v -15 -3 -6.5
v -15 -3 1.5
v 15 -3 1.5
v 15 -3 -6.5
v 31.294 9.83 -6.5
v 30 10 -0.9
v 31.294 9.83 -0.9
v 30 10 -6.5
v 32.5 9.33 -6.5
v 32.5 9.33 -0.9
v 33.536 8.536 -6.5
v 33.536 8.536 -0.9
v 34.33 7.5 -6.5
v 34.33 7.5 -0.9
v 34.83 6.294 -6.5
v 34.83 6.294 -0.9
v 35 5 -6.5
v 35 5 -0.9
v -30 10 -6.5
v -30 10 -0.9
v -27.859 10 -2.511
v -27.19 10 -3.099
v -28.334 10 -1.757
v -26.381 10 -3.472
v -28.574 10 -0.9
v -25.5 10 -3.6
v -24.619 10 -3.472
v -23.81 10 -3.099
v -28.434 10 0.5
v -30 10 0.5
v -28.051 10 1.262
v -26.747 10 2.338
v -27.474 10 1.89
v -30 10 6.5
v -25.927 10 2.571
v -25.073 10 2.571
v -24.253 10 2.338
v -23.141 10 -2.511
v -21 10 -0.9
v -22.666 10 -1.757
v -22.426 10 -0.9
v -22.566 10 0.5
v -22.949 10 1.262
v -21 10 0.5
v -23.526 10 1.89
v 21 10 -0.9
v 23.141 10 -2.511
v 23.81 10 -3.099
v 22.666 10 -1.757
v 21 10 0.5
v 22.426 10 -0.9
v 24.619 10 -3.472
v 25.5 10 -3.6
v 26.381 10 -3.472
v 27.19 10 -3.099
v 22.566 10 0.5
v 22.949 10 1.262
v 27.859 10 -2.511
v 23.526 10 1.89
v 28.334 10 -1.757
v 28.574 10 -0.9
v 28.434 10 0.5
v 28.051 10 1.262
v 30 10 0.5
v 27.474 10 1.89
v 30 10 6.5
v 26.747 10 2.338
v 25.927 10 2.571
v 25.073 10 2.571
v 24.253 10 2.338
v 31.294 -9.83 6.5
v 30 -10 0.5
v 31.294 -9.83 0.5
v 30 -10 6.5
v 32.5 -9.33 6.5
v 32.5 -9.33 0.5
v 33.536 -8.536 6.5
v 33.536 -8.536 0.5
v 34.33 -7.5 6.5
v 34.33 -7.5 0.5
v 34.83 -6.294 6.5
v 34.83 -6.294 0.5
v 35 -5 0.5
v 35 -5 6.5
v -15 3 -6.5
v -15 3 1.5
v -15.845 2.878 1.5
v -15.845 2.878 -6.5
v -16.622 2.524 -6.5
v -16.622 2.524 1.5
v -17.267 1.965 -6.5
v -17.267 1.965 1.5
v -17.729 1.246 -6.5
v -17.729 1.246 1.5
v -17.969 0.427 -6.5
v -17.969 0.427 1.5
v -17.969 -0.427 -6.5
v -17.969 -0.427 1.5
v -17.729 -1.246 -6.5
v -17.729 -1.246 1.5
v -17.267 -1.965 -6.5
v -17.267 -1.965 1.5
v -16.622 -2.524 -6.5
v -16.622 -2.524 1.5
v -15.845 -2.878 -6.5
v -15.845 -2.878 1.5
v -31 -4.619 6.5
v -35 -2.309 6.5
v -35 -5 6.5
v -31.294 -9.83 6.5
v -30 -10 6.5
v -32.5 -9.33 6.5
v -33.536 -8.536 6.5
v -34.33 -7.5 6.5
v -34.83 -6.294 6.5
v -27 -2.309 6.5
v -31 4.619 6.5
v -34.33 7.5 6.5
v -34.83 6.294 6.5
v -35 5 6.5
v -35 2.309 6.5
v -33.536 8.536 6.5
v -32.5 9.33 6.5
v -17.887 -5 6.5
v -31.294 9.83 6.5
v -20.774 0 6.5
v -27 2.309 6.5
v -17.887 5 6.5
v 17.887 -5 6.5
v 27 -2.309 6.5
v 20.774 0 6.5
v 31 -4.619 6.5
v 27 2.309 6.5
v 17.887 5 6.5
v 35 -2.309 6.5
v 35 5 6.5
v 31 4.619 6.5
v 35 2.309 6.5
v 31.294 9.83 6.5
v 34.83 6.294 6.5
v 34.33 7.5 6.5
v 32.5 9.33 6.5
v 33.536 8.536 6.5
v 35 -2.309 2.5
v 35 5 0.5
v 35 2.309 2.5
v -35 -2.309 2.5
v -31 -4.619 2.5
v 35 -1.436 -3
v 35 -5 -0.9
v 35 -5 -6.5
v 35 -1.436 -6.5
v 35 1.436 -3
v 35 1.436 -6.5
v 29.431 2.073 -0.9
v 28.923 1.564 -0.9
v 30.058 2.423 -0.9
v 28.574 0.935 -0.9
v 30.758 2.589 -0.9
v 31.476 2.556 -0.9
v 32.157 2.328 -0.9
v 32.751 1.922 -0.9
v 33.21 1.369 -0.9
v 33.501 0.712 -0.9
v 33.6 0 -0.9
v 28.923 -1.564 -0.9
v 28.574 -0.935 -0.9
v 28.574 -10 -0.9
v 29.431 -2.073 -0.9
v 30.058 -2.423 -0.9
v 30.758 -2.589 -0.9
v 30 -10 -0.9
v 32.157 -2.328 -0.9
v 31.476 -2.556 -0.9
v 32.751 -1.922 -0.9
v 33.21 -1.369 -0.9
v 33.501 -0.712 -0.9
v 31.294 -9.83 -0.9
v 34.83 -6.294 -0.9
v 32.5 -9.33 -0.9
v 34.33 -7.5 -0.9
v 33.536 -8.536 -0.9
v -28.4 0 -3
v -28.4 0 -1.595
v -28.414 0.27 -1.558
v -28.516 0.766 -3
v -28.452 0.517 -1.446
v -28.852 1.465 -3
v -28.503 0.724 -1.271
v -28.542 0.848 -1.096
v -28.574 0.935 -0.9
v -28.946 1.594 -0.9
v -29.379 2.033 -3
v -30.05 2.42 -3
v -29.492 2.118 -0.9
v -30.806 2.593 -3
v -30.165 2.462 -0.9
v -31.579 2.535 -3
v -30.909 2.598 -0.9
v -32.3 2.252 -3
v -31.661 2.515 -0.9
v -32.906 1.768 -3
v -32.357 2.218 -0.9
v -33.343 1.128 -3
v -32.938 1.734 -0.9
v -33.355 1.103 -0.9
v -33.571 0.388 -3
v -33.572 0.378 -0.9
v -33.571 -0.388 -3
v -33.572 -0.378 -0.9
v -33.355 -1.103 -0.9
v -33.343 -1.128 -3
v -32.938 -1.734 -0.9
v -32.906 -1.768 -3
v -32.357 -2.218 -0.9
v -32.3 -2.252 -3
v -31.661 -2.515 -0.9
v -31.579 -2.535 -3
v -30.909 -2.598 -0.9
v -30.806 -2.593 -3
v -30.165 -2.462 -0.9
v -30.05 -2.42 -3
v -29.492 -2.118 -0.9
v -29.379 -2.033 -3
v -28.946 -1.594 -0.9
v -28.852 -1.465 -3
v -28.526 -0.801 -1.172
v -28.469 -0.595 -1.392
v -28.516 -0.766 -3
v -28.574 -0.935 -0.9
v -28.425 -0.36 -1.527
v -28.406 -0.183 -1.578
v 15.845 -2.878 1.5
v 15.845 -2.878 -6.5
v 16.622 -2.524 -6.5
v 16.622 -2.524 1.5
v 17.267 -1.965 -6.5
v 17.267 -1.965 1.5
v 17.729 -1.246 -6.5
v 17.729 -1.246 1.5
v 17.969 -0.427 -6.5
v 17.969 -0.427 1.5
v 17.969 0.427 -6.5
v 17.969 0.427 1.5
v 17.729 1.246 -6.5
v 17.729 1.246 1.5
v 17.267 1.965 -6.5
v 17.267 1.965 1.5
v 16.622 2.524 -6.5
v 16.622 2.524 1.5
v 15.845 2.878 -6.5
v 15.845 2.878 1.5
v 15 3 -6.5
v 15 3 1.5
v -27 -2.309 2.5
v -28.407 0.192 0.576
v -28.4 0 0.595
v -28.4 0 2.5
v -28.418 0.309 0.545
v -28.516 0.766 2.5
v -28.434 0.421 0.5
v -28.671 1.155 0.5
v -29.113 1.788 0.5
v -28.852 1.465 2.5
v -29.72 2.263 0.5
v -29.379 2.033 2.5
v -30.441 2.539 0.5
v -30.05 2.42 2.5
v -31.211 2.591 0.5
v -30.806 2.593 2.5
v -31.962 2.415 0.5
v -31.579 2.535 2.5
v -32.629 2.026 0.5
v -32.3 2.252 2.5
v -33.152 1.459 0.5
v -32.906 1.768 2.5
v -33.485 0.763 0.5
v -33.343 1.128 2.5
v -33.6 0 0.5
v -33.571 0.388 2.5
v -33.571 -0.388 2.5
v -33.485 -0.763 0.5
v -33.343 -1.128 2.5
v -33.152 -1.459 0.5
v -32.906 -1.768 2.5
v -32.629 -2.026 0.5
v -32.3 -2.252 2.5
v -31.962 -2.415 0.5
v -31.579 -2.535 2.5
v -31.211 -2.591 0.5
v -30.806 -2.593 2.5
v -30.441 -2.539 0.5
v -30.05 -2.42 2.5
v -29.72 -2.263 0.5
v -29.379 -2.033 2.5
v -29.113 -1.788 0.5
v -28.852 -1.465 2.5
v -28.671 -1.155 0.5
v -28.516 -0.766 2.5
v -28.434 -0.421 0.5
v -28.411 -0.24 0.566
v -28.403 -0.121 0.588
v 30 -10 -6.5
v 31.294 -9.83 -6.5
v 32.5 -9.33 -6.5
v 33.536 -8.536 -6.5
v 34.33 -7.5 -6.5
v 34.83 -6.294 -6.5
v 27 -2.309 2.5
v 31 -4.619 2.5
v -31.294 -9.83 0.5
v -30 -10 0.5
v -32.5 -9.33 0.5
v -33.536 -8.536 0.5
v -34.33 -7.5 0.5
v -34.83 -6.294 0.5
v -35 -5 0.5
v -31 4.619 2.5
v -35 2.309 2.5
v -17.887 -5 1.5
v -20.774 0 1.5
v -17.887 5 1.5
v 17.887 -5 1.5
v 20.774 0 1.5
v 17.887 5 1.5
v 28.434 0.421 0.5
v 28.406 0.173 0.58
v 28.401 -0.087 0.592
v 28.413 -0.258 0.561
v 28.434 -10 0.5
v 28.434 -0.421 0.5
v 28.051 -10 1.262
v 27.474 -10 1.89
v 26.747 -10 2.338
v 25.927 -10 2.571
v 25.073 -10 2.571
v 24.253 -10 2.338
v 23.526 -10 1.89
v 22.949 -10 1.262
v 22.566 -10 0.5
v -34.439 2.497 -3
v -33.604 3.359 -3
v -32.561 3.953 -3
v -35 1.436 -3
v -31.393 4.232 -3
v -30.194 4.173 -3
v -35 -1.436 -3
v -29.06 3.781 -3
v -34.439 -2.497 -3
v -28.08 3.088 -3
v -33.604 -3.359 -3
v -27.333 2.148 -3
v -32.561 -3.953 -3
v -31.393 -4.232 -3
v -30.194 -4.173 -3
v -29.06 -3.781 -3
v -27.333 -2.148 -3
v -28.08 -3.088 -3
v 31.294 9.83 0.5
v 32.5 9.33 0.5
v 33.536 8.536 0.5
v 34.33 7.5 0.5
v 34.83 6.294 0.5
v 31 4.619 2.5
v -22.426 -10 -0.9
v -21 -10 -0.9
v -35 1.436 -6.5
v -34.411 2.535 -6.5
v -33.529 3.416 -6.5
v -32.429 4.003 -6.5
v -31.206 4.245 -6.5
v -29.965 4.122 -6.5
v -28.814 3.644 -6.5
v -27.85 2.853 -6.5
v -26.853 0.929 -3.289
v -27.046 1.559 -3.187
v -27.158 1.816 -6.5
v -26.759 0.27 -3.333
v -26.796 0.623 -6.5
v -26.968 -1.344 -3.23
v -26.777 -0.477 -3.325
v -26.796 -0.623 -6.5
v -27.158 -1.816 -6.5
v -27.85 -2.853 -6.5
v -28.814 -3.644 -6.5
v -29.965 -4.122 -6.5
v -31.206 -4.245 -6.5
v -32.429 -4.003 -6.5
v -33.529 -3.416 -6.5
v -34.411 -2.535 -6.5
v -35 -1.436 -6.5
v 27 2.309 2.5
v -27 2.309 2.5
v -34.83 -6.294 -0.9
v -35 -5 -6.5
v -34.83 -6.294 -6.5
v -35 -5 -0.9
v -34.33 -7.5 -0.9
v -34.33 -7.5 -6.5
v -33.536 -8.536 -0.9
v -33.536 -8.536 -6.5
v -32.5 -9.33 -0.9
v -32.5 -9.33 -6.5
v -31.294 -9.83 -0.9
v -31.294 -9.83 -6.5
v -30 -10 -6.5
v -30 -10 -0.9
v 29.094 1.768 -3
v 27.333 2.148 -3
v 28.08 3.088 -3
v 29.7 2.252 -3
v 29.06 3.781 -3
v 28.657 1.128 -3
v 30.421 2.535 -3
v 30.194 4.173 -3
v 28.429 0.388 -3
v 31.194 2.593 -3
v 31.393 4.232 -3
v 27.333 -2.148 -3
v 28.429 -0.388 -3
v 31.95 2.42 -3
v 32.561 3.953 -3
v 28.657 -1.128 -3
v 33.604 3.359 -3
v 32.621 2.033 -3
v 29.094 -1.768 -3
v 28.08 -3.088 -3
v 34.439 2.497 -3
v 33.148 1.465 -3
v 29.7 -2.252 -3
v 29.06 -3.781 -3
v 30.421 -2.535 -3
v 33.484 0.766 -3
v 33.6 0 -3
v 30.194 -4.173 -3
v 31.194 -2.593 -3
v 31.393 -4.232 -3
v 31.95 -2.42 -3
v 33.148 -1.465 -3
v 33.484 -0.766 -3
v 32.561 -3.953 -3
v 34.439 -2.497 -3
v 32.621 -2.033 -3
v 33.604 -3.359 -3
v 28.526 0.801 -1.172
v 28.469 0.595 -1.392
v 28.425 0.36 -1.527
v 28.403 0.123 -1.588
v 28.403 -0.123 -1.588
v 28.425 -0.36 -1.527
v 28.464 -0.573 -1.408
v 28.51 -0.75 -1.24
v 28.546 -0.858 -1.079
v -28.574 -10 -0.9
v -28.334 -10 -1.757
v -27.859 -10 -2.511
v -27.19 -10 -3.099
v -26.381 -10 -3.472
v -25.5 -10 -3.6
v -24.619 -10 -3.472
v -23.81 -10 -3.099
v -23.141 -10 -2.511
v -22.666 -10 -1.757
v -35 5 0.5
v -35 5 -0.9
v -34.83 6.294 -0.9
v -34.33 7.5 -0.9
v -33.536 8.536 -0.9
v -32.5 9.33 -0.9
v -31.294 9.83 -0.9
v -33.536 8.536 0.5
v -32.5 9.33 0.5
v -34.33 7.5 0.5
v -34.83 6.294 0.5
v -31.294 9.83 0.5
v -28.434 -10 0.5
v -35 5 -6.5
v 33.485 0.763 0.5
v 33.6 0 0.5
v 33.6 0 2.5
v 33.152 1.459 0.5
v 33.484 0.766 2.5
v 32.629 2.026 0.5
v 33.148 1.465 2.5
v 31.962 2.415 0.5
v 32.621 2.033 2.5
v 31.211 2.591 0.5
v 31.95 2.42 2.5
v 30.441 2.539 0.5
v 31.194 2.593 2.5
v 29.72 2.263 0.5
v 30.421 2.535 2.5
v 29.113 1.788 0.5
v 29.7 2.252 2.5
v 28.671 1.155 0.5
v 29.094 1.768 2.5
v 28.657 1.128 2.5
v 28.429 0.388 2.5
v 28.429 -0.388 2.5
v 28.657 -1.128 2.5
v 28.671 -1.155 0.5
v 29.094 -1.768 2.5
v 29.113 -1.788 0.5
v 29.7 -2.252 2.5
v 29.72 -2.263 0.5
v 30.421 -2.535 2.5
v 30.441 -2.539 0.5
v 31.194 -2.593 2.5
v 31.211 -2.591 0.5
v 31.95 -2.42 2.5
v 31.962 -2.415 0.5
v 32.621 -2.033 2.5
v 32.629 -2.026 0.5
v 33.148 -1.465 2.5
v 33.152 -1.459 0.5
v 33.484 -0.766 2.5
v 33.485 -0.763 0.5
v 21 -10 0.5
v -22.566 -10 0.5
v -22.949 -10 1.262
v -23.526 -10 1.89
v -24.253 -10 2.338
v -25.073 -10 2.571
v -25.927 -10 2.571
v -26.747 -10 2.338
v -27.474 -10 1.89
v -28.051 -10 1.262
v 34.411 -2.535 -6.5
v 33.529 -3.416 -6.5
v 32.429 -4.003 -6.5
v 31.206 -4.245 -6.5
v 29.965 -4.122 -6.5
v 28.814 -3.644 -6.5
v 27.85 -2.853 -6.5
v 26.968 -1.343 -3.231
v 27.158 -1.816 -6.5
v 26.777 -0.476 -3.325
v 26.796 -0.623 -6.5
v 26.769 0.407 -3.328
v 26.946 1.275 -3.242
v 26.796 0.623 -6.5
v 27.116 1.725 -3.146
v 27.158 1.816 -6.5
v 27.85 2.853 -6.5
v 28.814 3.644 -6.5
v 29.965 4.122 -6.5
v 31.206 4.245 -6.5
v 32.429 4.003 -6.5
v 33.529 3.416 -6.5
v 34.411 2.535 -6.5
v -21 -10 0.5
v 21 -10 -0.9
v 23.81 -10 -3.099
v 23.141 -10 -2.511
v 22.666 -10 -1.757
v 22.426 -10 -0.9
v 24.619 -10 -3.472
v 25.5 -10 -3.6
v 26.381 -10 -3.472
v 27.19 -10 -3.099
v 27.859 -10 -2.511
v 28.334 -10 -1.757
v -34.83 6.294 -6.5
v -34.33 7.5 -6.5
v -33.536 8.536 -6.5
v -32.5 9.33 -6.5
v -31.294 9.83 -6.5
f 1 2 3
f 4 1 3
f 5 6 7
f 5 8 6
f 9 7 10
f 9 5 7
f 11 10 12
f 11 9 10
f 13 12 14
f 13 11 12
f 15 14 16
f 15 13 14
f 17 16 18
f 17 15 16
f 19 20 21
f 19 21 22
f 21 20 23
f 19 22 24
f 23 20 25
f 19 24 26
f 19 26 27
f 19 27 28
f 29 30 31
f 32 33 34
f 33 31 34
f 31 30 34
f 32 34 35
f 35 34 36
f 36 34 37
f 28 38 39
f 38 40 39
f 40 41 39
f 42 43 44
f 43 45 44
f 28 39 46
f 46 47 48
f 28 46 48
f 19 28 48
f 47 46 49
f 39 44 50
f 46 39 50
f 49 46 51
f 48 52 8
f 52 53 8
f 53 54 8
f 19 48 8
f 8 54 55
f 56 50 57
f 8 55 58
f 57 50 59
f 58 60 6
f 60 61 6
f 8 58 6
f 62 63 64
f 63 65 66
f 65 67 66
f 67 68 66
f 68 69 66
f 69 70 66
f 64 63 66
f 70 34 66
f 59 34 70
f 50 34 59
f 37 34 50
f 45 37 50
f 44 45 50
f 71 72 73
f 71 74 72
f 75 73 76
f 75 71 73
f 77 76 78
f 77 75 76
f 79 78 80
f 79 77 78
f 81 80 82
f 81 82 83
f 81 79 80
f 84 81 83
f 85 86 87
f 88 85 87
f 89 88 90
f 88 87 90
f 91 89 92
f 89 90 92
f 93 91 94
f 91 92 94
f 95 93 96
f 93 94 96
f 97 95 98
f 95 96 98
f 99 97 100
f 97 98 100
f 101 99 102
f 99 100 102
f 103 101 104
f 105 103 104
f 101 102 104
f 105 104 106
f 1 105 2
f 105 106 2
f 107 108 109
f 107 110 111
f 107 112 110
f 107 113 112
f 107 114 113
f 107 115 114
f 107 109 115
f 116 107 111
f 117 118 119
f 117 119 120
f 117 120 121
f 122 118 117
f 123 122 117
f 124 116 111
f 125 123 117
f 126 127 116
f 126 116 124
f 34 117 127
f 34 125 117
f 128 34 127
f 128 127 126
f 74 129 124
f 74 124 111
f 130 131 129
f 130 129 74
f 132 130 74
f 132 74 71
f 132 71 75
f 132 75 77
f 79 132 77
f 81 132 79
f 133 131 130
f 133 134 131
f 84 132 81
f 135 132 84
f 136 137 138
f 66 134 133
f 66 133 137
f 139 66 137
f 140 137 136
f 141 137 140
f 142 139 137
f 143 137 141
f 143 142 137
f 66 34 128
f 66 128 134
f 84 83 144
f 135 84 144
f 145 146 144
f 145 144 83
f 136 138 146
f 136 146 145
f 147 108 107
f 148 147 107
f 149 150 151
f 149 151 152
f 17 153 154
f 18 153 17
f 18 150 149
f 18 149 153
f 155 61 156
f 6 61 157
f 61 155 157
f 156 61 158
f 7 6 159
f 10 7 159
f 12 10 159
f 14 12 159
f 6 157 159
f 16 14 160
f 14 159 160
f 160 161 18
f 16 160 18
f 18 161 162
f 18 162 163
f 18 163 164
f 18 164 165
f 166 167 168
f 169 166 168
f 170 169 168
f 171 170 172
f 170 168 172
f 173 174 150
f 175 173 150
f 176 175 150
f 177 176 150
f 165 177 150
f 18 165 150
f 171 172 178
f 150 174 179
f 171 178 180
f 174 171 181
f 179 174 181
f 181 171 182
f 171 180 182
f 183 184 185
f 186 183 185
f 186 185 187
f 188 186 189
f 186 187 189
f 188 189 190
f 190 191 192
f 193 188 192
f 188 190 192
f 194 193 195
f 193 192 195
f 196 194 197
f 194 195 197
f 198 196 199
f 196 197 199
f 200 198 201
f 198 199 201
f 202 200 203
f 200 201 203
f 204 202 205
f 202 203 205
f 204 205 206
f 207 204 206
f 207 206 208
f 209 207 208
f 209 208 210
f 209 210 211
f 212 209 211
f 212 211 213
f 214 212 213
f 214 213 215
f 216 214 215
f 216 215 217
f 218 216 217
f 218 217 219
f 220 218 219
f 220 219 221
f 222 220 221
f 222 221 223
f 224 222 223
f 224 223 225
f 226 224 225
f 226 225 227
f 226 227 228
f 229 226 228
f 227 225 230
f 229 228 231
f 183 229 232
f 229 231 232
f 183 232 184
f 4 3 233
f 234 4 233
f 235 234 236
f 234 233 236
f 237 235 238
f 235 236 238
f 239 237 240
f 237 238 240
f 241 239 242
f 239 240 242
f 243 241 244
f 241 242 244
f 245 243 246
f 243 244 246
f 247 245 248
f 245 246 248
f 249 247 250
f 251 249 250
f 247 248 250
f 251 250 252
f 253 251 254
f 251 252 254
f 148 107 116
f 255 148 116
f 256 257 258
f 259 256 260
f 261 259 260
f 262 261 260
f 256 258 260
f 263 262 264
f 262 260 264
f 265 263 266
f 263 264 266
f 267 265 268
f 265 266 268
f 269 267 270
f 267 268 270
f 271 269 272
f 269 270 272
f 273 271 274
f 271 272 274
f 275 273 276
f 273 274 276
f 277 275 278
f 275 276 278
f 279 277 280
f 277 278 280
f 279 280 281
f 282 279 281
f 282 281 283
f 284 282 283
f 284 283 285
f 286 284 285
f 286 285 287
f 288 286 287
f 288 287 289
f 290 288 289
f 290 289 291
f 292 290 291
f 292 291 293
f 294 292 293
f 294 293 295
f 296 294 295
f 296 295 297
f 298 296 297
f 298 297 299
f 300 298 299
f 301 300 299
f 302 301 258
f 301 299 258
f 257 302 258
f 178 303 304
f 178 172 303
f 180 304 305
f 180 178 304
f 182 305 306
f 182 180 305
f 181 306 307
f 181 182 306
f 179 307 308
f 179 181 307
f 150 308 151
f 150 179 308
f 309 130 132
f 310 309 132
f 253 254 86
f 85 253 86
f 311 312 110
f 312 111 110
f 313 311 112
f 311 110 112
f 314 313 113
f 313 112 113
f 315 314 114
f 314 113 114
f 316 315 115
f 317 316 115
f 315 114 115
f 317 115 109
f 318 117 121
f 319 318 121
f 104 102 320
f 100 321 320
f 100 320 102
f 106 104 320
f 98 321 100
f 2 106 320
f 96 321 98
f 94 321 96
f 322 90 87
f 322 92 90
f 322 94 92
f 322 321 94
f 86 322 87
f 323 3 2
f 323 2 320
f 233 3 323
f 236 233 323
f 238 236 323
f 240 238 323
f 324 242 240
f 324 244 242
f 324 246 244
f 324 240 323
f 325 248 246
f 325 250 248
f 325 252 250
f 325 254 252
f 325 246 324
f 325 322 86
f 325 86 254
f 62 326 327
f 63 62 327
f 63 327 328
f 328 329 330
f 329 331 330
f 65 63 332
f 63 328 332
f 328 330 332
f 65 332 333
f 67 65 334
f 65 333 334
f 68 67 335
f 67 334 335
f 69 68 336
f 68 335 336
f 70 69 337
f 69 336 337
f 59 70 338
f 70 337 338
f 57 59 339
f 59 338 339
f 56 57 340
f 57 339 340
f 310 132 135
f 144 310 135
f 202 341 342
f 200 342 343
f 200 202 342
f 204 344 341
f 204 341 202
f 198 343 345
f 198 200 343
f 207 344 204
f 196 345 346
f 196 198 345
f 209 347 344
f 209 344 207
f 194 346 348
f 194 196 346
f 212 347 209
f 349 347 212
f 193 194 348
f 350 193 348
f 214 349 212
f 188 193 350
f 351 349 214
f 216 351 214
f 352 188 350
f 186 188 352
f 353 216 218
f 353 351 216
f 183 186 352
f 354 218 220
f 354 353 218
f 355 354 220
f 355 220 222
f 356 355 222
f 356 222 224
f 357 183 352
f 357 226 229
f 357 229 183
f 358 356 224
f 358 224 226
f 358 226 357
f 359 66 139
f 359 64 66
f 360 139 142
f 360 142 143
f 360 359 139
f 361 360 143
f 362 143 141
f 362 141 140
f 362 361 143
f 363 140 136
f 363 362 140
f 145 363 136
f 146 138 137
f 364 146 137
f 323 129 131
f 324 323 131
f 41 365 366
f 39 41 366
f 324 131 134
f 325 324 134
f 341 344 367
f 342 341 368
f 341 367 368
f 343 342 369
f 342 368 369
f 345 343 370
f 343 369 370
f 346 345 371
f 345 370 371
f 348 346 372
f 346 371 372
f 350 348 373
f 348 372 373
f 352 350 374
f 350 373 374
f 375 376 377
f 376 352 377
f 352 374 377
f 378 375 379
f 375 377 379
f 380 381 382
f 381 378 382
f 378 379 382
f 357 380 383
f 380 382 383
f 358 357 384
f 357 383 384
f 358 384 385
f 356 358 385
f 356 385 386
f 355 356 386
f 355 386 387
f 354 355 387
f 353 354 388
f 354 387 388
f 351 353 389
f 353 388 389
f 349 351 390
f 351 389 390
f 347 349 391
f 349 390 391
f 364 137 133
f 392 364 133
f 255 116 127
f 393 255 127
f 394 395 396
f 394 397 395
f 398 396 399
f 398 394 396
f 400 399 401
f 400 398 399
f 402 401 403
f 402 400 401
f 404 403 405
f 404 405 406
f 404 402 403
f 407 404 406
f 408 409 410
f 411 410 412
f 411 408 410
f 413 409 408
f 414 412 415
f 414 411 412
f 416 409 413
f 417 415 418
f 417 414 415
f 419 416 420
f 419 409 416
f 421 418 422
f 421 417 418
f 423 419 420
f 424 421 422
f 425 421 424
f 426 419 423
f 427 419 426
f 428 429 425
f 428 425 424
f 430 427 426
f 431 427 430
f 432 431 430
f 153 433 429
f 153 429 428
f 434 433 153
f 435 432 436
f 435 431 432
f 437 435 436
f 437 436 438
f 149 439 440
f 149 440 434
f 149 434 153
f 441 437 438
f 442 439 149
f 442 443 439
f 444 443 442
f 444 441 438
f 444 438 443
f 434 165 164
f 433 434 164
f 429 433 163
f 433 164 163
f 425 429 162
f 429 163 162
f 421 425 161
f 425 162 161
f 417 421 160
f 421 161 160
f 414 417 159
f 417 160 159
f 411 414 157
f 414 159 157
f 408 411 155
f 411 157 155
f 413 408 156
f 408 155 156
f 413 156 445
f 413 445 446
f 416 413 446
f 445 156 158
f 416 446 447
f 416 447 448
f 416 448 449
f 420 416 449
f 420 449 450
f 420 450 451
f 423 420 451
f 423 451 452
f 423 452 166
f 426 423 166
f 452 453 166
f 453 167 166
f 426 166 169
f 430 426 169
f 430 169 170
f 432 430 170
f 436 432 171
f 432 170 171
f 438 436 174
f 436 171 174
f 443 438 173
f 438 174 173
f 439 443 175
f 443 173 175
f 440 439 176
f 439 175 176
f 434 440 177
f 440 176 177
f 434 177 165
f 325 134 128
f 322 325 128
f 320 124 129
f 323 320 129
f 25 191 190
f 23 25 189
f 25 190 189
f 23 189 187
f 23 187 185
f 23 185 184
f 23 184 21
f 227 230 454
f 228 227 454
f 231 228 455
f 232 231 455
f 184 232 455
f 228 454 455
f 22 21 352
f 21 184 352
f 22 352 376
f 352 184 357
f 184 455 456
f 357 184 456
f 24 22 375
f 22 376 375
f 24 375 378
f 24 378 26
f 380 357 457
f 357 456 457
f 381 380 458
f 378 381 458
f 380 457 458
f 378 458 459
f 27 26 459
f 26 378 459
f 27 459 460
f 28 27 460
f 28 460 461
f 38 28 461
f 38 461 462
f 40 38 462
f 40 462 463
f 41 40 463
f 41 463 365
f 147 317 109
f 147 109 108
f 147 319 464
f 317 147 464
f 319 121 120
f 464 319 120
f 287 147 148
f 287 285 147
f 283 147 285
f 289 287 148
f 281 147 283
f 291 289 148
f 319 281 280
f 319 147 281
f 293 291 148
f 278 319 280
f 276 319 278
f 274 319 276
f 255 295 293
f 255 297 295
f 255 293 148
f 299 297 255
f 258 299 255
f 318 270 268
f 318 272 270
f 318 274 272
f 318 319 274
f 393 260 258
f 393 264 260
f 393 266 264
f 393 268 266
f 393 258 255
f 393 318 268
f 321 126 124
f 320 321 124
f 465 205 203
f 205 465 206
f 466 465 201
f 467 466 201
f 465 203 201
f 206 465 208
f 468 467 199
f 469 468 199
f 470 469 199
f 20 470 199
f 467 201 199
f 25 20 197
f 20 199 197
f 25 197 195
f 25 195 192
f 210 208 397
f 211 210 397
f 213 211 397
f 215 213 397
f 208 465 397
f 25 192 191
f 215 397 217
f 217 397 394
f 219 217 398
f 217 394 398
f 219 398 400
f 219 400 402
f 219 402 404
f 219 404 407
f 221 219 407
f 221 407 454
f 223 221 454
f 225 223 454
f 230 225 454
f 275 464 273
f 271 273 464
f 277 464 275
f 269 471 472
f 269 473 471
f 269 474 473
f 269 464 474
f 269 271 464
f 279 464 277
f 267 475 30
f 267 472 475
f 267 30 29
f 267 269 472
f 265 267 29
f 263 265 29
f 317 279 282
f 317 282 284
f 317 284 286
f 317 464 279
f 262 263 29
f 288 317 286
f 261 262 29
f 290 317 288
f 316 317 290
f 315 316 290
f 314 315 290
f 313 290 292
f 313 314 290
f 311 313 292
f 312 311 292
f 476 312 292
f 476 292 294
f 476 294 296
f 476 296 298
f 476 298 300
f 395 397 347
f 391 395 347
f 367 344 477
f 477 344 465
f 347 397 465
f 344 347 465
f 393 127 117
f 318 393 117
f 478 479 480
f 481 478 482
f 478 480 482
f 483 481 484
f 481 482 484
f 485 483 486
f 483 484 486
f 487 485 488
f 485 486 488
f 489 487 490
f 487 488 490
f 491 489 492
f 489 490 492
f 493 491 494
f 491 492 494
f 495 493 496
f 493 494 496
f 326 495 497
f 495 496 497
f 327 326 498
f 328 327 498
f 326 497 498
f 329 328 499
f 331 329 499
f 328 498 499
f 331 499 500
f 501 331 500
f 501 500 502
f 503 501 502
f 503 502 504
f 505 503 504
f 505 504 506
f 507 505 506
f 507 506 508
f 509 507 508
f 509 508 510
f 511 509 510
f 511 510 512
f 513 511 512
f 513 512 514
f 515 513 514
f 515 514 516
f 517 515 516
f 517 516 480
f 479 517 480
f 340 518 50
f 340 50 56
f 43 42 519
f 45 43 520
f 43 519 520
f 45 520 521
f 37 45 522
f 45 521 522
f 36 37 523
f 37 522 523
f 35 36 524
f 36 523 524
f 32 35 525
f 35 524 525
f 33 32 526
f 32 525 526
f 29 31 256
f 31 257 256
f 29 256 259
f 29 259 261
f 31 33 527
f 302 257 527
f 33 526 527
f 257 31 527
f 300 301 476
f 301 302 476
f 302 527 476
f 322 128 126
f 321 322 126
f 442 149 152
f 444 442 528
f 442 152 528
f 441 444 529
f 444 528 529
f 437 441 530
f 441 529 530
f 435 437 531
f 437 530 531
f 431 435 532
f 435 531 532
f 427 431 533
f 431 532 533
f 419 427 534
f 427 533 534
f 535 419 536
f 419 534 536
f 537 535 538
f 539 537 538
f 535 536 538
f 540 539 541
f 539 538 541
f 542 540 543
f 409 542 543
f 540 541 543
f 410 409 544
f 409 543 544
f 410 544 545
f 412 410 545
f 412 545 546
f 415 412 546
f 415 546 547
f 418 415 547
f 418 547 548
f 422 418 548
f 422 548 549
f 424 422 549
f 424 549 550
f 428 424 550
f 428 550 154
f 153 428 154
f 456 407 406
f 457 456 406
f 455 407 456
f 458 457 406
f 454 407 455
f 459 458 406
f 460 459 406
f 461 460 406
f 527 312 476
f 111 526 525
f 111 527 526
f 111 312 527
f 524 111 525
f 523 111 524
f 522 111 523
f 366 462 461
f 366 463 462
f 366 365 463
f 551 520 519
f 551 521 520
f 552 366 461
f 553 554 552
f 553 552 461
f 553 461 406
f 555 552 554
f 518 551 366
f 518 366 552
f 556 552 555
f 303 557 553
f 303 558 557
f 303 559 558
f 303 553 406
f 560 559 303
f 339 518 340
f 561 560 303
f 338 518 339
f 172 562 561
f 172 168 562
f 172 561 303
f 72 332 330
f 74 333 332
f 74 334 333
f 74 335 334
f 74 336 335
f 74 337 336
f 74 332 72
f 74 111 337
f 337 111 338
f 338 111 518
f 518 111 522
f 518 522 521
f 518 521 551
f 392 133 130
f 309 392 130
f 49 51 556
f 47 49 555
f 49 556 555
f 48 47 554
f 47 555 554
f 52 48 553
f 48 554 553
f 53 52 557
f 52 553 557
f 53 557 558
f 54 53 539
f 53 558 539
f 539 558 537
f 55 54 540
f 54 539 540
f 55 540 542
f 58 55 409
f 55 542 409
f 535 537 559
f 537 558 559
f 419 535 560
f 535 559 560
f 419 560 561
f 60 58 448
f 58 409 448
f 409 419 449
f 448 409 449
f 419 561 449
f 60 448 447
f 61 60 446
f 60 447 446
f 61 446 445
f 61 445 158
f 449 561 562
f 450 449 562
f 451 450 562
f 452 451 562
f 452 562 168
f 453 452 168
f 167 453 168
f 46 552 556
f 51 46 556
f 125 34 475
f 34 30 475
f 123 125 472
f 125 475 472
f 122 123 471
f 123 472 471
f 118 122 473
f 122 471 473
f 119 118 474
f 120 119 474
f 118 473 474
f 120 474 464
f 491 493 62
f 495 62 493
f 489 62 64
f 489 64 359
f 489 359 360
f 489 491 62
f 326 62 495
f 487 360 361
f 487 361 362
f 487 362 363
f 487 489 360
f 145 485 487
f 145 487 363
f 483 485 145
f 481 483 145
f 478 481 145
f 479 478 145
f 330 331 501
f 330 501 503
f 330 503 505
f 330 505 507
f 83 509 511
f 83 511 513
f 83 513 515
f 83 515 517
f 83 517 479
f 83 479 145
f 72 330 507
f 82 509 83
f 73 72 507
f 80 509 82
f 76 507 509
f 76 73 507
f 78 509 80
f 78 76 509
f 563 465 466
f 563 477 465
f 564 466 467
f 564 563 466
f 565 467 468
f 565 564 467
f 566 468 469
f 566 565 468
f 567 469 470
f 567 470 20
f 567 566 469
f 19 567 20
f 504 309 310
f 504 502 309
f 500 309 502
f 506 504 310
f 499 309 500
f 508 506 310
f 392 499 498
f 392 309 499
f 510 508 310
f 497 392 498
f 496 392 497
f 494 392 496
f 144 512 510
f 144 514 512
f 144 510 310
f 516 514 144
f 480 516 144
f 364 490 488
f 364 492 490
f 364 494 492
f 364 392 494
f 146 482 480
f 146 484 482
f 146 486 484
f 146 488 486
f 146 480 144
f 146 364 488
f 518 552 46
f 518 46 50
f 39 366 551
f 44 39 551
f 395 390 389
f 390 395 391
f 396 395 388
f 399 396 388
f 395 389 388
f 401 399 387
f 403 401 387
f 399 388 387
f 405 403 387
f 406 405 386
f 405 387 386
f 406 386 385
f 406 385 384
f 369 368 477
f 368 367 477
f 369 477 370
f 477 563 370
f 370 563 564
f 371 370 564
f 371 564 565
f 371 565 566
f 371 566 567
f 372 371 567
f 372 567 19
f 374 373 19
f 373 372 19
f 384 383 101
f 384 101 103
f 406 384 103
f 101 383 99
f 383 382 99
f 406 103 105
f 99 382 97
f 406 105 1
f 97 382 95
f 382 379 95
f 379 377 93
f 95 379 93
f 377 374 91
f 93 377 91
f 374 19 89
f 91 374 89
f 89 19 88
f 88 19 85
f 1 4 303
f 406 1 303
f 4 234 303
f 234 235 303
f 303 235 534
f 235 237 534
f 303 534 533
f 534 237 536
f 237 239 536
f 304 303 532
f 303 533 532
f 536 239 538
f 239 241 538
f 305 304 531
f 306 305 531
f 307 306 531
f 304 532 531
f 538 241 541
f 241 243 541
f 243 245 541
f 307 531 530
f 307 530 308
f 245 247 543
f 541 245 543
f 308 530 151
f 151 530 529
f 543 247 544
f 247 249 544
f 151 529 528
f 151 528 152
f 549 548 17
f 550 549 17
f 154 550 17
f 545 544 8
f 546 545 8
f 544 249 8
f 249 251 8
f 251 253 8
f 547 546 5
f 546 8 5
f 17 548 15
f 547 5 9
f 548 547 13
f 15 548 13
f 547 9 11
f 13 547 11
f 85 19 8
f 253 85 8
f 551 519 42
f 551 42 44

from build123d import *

# Parameters (mm, degrees)
F0_W      = 70
F0_H      = 20
F1_DEPTH  = 6.5
F4_DEPTH  = 4
F5_R      = 2.6
F6_DEPTH  = 13.001
F7_DEPTH  = 13.001
F8_W      = 14
F8_H      = 1.4
F9_DEPTH  = 20.001
F11_R     = 5
F10_R     = 3.1
F12_DEPTH = 20.001
F13_R     = 4.25
F14_DEPTH = 3.5
F16_DEPTH = 5


with BuildPart() as f1:
    # F0 (on Top) → F1 (new body, symmetric)
    with BuildSketch(Plane.XY):
        Rectangle(F0_W, F0_H)
    extrude(amount=F1_DEPTH, both=True)

    # F3 (on face) → F4 (cut)
    with BuildSketch(Plane.XY.offset(6.5)):
        Polygon((-31, -4.6188021535), (-27, -2.3094010768), (-27, 2.3094010768), (-31, 4.6188021535), (-35, 2.3094010768), (-35, -2.3094010768), align=None)
        Polygon((35, -2.3094010768), (35, 2.3094010768), (31, 4.6188021535), (27, 2.3094010768), (27, -2.3094010768), (31, -4.6188021535), align=None)
    extrude(amount=-F4_DEPTH, mode=Mode.SUBTRACT)

    # F5 (on face) → F6 (cut, through all)
    with BuildSketch(Plane.XY.offset(6.5)):
        with Locations((-31, 0)):
            Circle(F5_R)
        with Locations((31, 0)):
            Circle(F5_R)
    extrude(amount=-F6_DEPTH, mode=Mode.SUBTRACT)

    # F2 (on face) → F7 (cut, through all)
    with BuildSketch(Plane.XY.offset(6.5)):
        with BuildLine():
            Line((-15, -3), (15, -3))
            ThreePointArc((15, -3), (18, 0), (15, 3))
            Line((15, 3), (-15, 3))
            ThreePointArc((-15, 3), (-18, 0), (-15, -3))
        make_face()
    extrude(amount=-F7_DEPTH, mode=Mode.SUBTRACT)

    # F8 (on face) → F9 (cut, through all)
    with BuildSketch(Plane.XZ.offset(10)):
        with Locations((-28, -0.2)):
            Rectangle(F8_W, F8_H)
        with Locations((28, -0.2)):
            Rectangle(F8_W, F8_H)
    extrude(amount=-F9_DEPTH, mode=Mode.SUBTRACT)

    # F11
    f11_edges = [f1.edges().sort_by_distance(p)[0] for p in [
        (35, 10, 3.5),
        (35, 10, -3.7),
        (35, -10, 3.5),
        (35, -10, -3.7),
        (-35, -10, -3.7),
        (-35, -10, 3.5),
        (-35, 10, 3.5),
        (-35, 10, -3.7),
    ]]
    fillet(f11_edges, radius=F11_R)

    # F10 (on face) → F12 (cut, through all)
    with BuildSketch(Plane.XZ.offset(10)):
        with Locations((-25.5, -0.5)):
            Circle(F10_R)
        with Locations((25.5, -0.5)):
            Circle(F10_R)
    extrude(amount=-F12_DEPTH, mode=Mode.SUBTRACT)

    # F13 (on face) → F14 (cut)
    with BuildSketch(Plane(origin=(0, 0, -6.5), x_dir=(1, 0, 0), z_dir=(0, 0, -1))):
        with Locations((31, 0)):
            Circle(F13_R)
        with Locations((-31, 0)):
            Circle(F13_R)
    extrude(amount=-F14_DEPTH, mode=Mode.SUBTRACT)

    # F15 (on face) → F16 (cut)
    with BuildSketch(Plane.XY.offset(6.5)):
        Polygon((-17.8867513459, -5), (-12.1132486541, -5), (-9.2264973081, 0), (-12.1132486541, 5), (-17.8867513459, 5), (-20.7735026919, 0), align=None)
        Polygon((-9.2264973081, 0), (-12.1132486541, -5), (12.1132486541, -5), (9.2264973081, 0), (12.1132486541, 5), (-12.1132486541, 5), align=None)
        Polygon((9.2264973081, 0), (12.1132486541, -5), (17.8867513459, -5), (20.7735026919, 0), (17.8867513459, 5), (12.1132486541, 5), align=None)
    extrude(amount=-F16_DEPTH, mode=Mode.SUBTRACT)


solid = f1.part
